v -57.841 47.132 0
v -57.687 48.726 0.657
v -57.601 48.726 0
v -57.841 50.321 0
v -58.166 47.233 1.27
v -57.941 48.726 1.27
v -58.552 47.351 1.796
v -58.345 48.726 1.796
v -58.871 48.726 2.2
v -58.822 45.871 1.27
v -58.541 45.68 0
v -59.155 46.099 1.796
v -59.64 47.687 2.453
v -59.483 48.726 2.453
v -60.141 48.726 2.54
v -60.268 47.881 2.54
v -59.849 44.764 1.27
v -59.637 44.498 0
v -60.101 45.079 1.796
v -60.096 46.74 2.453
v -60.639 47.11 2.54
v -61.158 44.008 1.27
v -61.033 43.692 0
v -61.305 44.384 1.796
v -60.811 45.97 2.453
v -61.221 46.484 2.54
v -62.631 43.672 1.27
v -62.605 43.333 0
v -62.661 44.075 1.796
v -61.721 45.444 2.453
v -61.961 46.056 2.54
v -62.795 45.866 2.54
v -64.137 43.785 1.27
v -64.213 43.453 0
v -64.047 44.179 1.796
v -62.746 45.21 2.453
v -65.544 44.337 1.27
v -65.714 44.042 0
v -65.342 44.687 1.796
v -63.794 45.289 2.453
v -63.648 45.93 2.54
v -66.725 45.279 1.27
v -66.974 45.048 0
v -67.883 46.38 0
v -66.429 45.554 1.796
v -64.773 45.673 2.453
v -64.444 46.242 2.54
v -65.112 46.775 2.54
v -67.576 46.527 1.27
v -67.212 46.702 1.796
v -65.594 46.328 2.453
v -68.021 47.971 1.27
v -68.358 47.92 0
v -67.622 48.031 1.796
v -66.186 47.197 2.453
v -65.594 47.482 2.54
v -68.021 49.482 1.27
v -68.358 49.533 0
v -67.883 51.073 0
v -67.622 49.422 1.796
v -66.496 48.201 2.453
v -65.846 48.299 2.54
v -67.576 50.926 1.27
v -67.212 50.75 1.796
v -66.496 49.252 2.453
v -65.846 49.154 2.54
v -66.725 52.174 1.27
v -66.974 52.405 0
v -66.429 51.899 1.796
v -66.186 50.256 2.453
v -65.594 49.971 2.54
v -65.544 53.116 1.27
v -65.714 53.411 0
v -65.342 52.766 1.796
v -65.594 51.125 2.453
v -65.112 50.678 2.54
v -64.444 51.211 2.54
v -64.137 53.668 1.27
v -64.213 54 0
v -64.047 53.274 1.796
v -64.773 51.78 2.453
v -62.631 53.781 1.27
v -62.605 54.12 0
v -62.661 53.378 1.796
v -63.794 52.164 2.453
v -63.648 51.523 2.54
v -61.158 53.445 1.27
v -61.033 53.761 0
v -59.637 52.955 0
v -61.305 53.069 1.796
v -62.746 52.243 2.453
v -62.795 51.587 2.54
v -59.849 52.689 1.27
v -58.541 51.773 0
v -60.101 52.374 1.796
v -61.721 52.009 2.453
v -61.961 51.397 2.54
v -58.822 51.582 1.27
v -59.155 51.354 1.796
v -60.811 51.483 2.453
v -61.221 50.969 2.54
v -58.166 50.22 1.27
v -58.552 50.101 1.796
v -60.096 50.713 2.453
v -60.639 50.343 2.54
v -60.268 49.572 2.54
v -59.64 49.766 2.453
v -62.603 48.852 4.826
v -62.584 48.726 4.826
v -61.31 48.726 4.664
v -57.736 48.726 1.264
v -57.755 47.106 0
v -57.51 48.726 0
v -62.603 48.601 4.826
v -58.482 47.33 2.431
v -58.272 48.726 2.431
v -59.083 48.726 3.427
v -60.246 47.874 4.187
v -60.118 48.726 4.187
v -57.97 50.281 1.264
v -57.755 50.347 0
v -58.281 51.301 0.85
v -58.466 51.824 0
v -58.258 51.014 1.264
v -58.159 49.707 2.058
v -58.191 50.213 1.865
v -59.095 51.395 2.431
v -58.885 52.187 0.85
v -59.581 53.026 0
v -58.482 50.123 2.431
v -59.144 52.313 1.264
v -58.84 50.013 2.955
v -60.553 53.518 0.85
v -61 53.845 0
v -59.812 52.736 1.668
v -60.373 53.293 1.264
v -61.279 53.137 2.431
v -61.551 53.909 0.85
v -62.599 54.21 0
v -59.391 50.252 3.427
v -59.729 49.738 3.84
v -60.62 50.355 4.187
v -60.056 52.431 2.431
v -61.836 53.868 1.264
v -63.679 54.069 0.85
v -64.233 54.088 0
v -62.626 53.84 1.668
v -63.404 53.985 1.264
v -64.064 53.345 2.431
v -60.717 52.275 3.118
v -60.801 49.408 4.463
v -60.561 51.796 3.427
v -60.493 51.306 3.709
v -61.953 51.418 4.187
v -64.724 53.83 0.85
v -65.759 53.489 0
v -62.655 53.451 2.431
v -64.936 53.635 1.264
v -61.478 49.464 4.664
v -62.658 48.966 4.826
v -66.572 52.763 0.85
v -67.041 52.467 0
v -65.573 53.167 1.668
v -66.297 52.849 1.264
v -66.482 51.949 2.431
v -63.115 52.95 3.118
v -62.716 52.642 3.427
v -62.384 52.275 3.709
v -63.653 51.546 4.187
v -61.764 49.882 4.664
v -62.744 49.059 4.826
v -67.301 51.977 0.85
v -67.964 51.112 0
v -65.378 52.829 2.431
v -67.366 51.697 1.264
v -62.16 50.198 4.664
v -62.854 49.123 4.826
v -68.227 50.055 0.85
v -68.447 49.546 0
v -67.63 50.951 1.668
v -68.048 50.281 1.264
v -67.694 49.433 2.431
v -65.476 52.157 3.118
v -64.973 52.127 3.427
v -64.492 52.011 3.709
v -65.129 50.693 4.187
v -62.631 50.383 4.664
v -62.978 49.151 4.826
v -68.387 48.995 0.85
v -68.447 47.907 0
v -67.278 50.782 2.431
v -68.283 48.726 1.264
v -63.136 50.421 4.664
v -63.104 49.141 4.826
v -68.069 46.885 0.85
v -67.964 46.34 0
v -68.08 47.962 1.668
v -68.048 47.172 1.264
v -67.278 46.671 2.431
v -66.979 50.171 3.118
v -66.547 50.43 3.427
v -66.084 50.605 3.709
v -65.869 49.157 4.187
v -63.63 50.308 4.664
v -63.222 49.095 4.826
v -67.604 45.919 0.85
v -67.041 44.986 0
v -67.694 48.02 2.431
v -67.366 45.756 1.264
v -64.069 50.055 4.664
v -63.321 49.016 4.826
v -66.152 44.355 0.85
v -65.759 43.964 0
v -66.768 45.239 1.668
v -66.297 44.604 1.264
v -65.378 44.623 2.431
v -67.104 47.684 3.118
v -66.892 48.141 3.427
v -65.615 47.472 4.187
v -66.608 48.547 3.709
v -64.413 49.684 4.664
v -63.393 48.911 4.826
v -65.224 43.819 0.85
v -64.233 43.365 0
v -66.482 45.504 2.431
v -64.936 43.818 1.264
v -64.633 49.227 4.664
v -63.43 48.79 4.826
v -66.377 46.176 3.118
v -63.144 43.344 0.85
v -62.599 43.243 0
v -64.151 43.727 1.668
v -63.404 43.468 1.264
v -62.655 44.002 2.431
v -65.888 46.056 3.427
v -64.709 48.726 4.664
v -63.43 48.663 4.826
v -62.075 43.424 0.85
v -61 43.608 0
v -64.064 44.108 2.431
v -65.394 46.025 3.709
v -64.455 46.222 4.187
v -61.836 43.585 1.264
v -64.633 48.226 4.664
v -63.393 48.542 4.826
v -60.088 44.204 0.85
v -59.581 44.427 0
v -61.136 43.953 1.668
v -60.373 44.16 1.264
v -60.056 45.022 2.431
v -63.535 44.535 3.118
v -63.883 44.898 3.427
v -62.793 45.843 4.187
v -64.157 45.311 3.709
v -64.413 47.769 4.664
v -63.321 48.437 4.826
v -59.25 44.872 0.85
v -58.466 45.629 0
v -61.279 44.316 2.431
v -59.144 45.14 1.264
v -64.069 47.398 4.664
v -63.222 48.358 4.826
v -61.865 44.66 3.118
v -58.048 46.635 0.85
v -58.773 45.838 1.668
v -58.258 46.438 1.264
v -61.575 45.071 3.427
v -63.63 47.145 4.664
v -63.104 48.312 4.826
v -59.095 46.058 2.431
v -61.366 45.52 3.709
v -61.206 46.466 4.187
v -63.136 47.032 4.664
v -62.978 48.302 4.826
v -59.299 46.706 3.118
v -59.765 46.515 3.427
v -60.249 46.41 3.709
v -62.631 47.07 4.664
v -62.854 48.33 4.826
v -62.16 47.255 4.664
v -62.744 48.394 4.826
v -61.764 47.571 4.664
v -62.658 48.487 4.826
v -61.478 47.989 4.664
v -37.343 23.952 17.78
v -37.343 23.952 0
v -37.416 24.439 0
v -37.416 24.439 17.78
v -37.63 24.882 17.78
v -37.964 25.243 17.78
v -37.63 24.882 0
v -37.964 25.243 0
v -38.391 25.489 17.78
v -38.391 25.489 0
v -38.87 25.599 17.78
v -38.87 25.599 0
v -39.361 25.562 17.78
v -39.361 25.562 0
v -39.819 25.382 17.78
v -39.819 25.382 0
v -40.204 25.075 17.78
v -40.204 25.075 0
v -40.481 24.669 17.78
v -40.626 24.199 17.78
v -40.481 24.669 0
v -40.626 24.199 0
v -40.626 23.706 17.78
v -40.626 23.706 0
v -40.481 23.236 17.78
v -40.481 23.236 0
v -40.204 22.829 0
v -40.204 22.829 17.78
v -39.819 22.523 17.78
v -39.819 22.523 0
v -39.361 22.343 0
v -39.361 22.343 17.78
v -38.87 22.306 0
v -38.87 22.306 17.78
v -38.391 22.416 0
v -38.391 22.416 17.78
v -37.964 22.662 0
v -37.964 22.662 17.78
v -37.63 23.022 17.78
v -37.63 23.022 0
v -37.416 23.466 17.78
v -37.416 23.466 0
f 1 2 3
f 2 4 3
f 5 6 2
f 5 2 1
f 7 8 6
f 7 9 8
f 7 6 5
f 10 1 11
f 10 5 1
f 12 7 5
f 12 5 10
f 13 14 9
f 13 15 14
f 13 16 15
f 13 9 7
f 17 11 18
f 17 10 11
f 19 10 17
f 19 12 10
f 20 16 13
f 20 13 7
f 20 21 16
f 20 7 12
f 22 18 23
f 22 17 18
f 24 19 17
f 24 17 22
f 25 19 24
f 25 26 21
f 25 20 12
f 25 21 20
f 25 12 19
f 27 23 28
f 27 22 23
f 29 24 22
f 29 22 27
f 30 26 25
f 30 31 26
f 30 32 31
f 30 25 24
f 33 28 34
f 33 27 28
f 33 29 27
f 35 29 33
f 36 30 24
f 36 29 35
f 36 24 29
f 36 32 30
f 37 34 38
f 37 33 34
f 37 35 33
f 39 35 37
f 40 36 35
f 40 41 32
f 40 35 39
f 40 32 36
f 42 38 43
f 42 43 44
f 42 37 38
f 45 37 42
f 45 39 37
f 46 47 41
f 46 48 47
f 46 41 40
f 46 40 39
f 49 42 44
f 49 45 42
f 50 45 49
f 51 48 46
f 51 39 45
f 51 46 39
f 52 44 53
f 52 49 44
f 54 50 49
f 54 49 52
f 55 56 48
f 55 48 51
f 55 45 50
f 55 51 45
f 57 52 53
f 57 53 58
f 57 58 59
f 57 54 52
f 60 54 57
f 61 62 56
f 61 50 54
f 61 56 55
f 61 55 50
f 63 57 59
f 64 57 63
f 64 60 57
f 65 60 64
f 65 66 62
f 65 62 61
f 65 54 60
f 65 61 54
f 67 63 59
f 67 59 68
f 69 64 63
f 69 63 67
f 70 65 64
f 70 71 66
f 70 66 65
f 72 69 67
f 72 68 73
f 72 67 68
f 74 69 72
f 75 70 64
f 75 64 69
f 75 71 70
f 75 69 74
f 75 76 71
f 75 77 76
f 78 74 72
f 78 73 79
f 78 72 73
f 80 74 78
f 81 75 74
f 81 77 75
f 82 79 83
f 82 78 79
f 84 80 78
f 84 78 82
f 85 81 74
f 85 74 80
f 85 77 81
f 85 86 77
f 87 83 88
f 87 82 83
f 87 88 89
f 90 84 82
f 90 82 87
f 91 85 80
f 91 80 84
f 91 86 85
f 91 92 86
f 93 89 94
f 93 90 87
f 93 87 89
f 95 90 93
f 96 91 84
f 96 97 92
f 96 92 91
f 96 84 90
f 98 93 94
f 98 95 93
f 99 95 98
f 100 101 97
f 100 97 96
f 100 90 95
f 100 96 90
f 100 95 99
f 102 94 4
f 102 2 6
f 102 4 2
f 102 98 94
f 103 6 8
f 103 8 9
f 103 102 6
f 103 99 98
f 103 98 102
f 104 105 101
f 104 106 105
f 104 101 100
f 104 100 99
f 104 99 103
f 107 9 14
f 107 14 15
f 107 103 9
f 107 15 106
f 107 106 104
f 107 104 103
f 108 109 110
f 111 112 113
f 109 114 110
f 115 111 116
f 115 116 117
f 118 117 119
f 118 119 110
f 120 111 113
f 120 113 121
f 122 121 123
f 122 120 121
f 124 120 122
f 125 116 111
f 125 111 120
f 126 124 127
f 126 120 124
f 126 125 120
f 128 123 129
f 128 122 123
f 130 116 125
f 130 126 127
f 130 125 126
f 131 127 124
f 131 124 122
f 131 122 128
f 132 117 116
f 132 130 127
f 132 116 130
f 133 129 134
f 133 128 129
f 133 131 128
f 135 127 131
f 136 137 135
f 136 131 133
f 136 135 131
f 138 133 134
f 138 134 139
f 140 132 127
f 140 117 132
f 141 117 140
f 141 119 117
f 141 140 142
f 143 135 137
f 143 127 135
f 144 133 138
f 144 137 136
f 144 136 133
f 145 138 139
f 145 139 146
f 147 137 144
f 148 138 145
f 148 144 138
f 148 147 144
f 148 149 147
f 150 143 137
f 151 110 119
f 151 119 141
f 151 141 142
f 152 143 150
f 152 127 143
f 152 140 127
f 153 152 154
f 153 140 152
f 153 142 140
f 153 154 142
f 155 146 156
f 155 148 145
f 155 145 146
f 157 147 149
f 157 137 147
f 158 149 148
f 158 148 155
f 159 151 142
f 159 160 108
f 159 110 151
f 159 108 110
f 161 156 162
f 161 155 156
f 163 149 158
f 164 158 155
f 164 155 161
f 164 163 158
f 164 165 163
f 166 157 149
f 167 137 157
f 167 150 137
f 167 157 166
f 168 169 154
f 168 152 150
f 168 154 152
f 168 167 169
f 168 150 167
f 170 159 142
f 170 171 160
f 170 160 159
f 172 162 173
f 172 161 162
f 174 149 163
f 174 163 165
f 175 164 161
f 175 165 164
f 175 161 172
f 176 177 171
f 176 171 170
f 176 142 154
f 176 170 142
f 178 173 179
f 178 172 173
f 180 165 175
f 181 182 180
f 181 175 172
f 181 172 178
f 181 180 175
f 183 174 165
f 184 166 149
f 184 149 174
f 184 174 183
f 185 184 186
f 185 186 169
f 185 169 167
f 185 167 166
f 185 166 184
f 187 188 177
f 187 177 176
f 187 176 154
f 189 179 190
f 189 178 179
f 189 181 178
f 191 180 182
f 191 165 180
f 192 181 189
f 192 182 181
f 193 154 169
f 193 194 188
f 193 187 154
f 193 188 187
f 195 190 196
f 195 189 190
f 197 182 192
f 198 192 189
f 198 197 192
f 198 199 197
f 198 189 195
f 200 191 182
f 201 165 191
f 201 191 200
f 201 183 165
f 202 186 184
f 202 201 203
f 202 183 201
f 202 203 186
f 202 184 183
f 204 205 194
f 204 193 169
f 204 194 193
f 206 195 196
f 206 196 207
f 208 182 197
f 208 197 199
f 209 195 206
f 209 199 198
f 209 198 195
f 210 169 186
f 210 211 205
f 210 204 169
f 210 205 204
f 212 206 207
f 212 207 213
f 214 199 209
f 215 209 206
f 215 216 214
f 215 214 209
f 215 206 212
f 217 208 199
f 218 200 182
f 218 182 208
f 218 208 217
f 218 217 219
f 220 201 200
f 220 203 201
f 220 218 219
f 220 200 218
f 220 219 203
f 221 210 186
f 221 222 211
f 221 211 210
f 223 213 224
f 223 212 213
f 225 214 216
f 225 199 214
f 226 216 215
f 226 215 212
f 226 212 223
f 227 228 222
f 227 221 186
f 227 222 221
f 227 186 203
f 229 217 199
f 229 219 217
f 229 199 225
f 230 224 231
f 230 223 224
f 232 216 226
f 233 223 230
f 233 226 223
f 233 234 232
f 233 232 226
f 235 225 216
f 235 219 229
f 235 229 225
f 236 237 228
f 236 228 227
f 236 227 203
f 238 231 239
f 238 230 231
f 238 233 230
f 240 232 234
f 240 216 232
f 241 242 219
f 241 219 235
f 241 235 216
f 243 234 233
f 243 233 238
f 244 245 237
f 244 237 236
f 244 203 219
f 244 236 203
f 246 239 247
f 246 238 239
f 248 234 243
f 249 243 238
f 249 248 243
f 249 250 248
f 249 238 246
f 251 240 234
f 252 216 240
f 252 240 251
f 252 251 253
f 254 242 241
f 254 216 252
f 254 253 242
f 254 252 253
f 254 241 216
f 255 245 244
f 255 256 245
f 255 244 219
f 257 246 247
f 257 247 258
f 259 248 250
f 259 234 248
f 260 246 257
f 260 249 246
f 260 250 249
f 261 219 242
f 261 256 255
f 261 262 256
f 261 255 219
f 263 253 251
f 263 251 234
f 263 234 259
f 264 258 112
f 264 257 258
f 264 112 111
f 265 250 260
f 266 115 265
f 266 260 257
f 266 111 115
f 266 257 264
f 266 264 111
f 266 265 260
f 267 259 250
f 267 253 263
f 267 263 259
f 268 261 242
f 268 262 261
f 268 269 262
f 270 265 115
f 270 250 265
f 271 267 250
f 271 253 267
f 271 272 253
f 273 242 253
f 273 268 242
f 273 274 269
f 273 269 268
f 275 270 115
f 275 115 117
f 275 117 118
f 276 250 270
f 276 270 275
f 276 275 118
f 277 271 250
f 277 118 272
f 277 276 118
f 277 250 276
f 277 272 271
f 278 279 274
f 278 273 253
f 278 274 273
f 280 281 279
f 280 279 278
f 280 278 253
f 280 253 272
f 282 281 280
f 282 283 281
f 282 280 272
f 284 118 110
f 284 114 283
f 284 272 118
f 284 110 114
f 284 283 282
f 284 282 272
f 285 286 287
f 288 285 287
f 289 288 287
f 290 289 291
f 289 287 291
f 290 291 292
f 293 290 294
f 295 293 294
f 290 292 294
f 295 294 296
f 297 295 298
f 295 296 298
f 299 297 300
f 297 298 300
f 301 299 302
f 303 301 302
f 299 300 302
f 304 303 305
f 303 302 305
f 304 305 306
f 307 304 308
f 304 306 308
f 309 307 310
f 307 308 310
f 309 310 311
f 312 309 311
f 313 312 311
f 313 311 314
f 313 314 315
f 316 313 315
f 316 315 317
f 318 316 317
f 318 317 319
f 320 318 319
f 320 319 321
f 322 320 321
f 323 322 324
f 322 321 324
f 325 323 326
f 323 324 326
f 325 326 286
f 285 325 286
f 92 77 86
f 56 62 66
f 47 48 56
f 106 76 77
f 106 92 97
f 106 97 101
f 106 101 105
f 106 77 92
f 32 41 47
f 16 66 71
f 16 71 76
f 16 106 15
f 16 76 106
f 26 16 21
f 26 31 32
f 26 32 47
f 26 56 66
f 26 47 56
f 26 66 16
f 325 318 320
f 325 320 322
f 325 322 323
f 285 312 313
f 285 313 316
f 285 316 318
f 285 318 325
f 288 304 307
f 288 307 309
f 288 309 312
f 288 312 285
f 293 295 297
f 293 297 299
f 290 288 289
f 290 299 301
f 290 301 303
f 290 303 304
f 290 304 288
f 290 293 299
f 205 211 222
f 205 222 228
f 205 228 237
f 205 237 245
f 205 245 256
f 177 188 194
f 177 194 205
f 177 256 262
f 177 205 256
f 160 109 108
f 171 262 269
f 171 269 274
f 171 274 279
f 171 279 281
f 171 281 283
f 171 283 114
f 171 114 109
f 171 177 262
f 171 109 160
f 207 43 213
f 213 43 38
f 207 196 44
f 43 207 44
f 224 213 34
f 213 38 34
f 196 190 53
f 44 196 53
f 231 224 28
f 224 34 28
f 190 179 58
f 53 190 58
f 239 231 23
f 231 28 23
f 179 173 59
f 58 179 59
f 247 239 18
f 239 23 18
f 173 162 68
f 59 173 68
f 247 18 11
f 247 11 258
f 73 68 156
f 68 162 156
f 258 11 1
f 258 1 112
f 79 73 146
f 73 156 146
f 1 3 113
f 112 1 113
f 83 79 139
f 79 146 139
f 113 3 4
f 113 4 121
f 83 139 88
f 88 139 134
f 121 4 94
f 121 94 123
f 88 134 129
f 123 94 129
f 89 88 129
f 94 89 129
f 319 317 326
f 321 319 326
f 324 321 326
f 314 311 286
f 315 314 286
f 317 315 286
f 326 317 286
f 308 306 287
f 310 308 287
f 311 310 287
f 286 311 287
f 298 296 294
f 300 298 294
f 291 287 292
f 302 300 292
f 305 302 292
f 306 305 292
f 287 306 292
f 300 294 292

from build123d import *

# Parameters (mm, degrees)
F0_R     = 1.651
F1_DEPTH = 17.78
F2_R     = 5.4991
F3_DEPTH = 4.826
F4_R     = 5.4087768166
F5_DEPTH = 2.54
F6_R     = 2.53999


# Not quite as in the source:
# - a fillet or chamfer that OpenCascade refuses, or shapes differently, is made with other operations: its cross-section is extruded or revolved along the edge and cut away or added
# - a fillet or chamfer is up to 0.001 mm smaller than in the source, because OpenCascade refuses the exact size


with BuildPart() as f1:
    # F0 (on Top) → F1 (new body)
    with BuildSketch(Plane.XY):
        with Locations((-38.9938168228, 23.95244129)):
            Circle(F0_R)
    extrude(amount=F1_DEPTH)


with BuildPart() as f3:
    # F2 (on Top) → F3 (new body)
    with BuildSketch(Plane.XY):
        with Locations((-63.0094558001, 48.7264692783)):
            Circle(F2_R)
    extrude(amount=F3_DEPTH)

    # F4 (on face) → F5 (cut)
    with BuildSketch(Plane(origin=(0, 0, 0), x_dir=(1, 0, 0), z_dir=(0, 0, -1))):
        with Locations((-63.0094558001, -48.7264692783)):
            Circle(F4_R)
    extrude(amount=-F5_DEPTH, mode=Mode.SUBTRACT)

    # F6 (radius 2.54 in the source; OpenCascade refuses exactly that, so slightly less here)
    f6_edges = [f3.edges().sort_by_distance(p)[0] for p in [
        (-68.418233, 48.726469, 2.54),
    ]]
    fillet(f6_edges, radius=F6_R)

    # F7: fillet of radius 5.08 on 1 edges, made by hand

    # F7_s1 → F7_t2 (revolve, cut)
    with BuildSketch(Plane.XZ.offset(-48.7264692783)):
        with BuildLine():
            ThreePointArc((-57.5103558001, 0), (-59.0828534433, 3.4268096935), (-62.5840018263, 4.826))
            Line((-62.5840018263, 4.826), (-57.5103558001, 4.826))
            Line((-57.5103558001, 4.826), (-57.5103558001, 0))
        make_face()
    revolve(axis=Axis((-63.0094558001, 48.7264692783, 4.826), (0, 0, 1)), mode=Mode.SUBTRACT)


solid = Compound([f1.part, f3.part])
